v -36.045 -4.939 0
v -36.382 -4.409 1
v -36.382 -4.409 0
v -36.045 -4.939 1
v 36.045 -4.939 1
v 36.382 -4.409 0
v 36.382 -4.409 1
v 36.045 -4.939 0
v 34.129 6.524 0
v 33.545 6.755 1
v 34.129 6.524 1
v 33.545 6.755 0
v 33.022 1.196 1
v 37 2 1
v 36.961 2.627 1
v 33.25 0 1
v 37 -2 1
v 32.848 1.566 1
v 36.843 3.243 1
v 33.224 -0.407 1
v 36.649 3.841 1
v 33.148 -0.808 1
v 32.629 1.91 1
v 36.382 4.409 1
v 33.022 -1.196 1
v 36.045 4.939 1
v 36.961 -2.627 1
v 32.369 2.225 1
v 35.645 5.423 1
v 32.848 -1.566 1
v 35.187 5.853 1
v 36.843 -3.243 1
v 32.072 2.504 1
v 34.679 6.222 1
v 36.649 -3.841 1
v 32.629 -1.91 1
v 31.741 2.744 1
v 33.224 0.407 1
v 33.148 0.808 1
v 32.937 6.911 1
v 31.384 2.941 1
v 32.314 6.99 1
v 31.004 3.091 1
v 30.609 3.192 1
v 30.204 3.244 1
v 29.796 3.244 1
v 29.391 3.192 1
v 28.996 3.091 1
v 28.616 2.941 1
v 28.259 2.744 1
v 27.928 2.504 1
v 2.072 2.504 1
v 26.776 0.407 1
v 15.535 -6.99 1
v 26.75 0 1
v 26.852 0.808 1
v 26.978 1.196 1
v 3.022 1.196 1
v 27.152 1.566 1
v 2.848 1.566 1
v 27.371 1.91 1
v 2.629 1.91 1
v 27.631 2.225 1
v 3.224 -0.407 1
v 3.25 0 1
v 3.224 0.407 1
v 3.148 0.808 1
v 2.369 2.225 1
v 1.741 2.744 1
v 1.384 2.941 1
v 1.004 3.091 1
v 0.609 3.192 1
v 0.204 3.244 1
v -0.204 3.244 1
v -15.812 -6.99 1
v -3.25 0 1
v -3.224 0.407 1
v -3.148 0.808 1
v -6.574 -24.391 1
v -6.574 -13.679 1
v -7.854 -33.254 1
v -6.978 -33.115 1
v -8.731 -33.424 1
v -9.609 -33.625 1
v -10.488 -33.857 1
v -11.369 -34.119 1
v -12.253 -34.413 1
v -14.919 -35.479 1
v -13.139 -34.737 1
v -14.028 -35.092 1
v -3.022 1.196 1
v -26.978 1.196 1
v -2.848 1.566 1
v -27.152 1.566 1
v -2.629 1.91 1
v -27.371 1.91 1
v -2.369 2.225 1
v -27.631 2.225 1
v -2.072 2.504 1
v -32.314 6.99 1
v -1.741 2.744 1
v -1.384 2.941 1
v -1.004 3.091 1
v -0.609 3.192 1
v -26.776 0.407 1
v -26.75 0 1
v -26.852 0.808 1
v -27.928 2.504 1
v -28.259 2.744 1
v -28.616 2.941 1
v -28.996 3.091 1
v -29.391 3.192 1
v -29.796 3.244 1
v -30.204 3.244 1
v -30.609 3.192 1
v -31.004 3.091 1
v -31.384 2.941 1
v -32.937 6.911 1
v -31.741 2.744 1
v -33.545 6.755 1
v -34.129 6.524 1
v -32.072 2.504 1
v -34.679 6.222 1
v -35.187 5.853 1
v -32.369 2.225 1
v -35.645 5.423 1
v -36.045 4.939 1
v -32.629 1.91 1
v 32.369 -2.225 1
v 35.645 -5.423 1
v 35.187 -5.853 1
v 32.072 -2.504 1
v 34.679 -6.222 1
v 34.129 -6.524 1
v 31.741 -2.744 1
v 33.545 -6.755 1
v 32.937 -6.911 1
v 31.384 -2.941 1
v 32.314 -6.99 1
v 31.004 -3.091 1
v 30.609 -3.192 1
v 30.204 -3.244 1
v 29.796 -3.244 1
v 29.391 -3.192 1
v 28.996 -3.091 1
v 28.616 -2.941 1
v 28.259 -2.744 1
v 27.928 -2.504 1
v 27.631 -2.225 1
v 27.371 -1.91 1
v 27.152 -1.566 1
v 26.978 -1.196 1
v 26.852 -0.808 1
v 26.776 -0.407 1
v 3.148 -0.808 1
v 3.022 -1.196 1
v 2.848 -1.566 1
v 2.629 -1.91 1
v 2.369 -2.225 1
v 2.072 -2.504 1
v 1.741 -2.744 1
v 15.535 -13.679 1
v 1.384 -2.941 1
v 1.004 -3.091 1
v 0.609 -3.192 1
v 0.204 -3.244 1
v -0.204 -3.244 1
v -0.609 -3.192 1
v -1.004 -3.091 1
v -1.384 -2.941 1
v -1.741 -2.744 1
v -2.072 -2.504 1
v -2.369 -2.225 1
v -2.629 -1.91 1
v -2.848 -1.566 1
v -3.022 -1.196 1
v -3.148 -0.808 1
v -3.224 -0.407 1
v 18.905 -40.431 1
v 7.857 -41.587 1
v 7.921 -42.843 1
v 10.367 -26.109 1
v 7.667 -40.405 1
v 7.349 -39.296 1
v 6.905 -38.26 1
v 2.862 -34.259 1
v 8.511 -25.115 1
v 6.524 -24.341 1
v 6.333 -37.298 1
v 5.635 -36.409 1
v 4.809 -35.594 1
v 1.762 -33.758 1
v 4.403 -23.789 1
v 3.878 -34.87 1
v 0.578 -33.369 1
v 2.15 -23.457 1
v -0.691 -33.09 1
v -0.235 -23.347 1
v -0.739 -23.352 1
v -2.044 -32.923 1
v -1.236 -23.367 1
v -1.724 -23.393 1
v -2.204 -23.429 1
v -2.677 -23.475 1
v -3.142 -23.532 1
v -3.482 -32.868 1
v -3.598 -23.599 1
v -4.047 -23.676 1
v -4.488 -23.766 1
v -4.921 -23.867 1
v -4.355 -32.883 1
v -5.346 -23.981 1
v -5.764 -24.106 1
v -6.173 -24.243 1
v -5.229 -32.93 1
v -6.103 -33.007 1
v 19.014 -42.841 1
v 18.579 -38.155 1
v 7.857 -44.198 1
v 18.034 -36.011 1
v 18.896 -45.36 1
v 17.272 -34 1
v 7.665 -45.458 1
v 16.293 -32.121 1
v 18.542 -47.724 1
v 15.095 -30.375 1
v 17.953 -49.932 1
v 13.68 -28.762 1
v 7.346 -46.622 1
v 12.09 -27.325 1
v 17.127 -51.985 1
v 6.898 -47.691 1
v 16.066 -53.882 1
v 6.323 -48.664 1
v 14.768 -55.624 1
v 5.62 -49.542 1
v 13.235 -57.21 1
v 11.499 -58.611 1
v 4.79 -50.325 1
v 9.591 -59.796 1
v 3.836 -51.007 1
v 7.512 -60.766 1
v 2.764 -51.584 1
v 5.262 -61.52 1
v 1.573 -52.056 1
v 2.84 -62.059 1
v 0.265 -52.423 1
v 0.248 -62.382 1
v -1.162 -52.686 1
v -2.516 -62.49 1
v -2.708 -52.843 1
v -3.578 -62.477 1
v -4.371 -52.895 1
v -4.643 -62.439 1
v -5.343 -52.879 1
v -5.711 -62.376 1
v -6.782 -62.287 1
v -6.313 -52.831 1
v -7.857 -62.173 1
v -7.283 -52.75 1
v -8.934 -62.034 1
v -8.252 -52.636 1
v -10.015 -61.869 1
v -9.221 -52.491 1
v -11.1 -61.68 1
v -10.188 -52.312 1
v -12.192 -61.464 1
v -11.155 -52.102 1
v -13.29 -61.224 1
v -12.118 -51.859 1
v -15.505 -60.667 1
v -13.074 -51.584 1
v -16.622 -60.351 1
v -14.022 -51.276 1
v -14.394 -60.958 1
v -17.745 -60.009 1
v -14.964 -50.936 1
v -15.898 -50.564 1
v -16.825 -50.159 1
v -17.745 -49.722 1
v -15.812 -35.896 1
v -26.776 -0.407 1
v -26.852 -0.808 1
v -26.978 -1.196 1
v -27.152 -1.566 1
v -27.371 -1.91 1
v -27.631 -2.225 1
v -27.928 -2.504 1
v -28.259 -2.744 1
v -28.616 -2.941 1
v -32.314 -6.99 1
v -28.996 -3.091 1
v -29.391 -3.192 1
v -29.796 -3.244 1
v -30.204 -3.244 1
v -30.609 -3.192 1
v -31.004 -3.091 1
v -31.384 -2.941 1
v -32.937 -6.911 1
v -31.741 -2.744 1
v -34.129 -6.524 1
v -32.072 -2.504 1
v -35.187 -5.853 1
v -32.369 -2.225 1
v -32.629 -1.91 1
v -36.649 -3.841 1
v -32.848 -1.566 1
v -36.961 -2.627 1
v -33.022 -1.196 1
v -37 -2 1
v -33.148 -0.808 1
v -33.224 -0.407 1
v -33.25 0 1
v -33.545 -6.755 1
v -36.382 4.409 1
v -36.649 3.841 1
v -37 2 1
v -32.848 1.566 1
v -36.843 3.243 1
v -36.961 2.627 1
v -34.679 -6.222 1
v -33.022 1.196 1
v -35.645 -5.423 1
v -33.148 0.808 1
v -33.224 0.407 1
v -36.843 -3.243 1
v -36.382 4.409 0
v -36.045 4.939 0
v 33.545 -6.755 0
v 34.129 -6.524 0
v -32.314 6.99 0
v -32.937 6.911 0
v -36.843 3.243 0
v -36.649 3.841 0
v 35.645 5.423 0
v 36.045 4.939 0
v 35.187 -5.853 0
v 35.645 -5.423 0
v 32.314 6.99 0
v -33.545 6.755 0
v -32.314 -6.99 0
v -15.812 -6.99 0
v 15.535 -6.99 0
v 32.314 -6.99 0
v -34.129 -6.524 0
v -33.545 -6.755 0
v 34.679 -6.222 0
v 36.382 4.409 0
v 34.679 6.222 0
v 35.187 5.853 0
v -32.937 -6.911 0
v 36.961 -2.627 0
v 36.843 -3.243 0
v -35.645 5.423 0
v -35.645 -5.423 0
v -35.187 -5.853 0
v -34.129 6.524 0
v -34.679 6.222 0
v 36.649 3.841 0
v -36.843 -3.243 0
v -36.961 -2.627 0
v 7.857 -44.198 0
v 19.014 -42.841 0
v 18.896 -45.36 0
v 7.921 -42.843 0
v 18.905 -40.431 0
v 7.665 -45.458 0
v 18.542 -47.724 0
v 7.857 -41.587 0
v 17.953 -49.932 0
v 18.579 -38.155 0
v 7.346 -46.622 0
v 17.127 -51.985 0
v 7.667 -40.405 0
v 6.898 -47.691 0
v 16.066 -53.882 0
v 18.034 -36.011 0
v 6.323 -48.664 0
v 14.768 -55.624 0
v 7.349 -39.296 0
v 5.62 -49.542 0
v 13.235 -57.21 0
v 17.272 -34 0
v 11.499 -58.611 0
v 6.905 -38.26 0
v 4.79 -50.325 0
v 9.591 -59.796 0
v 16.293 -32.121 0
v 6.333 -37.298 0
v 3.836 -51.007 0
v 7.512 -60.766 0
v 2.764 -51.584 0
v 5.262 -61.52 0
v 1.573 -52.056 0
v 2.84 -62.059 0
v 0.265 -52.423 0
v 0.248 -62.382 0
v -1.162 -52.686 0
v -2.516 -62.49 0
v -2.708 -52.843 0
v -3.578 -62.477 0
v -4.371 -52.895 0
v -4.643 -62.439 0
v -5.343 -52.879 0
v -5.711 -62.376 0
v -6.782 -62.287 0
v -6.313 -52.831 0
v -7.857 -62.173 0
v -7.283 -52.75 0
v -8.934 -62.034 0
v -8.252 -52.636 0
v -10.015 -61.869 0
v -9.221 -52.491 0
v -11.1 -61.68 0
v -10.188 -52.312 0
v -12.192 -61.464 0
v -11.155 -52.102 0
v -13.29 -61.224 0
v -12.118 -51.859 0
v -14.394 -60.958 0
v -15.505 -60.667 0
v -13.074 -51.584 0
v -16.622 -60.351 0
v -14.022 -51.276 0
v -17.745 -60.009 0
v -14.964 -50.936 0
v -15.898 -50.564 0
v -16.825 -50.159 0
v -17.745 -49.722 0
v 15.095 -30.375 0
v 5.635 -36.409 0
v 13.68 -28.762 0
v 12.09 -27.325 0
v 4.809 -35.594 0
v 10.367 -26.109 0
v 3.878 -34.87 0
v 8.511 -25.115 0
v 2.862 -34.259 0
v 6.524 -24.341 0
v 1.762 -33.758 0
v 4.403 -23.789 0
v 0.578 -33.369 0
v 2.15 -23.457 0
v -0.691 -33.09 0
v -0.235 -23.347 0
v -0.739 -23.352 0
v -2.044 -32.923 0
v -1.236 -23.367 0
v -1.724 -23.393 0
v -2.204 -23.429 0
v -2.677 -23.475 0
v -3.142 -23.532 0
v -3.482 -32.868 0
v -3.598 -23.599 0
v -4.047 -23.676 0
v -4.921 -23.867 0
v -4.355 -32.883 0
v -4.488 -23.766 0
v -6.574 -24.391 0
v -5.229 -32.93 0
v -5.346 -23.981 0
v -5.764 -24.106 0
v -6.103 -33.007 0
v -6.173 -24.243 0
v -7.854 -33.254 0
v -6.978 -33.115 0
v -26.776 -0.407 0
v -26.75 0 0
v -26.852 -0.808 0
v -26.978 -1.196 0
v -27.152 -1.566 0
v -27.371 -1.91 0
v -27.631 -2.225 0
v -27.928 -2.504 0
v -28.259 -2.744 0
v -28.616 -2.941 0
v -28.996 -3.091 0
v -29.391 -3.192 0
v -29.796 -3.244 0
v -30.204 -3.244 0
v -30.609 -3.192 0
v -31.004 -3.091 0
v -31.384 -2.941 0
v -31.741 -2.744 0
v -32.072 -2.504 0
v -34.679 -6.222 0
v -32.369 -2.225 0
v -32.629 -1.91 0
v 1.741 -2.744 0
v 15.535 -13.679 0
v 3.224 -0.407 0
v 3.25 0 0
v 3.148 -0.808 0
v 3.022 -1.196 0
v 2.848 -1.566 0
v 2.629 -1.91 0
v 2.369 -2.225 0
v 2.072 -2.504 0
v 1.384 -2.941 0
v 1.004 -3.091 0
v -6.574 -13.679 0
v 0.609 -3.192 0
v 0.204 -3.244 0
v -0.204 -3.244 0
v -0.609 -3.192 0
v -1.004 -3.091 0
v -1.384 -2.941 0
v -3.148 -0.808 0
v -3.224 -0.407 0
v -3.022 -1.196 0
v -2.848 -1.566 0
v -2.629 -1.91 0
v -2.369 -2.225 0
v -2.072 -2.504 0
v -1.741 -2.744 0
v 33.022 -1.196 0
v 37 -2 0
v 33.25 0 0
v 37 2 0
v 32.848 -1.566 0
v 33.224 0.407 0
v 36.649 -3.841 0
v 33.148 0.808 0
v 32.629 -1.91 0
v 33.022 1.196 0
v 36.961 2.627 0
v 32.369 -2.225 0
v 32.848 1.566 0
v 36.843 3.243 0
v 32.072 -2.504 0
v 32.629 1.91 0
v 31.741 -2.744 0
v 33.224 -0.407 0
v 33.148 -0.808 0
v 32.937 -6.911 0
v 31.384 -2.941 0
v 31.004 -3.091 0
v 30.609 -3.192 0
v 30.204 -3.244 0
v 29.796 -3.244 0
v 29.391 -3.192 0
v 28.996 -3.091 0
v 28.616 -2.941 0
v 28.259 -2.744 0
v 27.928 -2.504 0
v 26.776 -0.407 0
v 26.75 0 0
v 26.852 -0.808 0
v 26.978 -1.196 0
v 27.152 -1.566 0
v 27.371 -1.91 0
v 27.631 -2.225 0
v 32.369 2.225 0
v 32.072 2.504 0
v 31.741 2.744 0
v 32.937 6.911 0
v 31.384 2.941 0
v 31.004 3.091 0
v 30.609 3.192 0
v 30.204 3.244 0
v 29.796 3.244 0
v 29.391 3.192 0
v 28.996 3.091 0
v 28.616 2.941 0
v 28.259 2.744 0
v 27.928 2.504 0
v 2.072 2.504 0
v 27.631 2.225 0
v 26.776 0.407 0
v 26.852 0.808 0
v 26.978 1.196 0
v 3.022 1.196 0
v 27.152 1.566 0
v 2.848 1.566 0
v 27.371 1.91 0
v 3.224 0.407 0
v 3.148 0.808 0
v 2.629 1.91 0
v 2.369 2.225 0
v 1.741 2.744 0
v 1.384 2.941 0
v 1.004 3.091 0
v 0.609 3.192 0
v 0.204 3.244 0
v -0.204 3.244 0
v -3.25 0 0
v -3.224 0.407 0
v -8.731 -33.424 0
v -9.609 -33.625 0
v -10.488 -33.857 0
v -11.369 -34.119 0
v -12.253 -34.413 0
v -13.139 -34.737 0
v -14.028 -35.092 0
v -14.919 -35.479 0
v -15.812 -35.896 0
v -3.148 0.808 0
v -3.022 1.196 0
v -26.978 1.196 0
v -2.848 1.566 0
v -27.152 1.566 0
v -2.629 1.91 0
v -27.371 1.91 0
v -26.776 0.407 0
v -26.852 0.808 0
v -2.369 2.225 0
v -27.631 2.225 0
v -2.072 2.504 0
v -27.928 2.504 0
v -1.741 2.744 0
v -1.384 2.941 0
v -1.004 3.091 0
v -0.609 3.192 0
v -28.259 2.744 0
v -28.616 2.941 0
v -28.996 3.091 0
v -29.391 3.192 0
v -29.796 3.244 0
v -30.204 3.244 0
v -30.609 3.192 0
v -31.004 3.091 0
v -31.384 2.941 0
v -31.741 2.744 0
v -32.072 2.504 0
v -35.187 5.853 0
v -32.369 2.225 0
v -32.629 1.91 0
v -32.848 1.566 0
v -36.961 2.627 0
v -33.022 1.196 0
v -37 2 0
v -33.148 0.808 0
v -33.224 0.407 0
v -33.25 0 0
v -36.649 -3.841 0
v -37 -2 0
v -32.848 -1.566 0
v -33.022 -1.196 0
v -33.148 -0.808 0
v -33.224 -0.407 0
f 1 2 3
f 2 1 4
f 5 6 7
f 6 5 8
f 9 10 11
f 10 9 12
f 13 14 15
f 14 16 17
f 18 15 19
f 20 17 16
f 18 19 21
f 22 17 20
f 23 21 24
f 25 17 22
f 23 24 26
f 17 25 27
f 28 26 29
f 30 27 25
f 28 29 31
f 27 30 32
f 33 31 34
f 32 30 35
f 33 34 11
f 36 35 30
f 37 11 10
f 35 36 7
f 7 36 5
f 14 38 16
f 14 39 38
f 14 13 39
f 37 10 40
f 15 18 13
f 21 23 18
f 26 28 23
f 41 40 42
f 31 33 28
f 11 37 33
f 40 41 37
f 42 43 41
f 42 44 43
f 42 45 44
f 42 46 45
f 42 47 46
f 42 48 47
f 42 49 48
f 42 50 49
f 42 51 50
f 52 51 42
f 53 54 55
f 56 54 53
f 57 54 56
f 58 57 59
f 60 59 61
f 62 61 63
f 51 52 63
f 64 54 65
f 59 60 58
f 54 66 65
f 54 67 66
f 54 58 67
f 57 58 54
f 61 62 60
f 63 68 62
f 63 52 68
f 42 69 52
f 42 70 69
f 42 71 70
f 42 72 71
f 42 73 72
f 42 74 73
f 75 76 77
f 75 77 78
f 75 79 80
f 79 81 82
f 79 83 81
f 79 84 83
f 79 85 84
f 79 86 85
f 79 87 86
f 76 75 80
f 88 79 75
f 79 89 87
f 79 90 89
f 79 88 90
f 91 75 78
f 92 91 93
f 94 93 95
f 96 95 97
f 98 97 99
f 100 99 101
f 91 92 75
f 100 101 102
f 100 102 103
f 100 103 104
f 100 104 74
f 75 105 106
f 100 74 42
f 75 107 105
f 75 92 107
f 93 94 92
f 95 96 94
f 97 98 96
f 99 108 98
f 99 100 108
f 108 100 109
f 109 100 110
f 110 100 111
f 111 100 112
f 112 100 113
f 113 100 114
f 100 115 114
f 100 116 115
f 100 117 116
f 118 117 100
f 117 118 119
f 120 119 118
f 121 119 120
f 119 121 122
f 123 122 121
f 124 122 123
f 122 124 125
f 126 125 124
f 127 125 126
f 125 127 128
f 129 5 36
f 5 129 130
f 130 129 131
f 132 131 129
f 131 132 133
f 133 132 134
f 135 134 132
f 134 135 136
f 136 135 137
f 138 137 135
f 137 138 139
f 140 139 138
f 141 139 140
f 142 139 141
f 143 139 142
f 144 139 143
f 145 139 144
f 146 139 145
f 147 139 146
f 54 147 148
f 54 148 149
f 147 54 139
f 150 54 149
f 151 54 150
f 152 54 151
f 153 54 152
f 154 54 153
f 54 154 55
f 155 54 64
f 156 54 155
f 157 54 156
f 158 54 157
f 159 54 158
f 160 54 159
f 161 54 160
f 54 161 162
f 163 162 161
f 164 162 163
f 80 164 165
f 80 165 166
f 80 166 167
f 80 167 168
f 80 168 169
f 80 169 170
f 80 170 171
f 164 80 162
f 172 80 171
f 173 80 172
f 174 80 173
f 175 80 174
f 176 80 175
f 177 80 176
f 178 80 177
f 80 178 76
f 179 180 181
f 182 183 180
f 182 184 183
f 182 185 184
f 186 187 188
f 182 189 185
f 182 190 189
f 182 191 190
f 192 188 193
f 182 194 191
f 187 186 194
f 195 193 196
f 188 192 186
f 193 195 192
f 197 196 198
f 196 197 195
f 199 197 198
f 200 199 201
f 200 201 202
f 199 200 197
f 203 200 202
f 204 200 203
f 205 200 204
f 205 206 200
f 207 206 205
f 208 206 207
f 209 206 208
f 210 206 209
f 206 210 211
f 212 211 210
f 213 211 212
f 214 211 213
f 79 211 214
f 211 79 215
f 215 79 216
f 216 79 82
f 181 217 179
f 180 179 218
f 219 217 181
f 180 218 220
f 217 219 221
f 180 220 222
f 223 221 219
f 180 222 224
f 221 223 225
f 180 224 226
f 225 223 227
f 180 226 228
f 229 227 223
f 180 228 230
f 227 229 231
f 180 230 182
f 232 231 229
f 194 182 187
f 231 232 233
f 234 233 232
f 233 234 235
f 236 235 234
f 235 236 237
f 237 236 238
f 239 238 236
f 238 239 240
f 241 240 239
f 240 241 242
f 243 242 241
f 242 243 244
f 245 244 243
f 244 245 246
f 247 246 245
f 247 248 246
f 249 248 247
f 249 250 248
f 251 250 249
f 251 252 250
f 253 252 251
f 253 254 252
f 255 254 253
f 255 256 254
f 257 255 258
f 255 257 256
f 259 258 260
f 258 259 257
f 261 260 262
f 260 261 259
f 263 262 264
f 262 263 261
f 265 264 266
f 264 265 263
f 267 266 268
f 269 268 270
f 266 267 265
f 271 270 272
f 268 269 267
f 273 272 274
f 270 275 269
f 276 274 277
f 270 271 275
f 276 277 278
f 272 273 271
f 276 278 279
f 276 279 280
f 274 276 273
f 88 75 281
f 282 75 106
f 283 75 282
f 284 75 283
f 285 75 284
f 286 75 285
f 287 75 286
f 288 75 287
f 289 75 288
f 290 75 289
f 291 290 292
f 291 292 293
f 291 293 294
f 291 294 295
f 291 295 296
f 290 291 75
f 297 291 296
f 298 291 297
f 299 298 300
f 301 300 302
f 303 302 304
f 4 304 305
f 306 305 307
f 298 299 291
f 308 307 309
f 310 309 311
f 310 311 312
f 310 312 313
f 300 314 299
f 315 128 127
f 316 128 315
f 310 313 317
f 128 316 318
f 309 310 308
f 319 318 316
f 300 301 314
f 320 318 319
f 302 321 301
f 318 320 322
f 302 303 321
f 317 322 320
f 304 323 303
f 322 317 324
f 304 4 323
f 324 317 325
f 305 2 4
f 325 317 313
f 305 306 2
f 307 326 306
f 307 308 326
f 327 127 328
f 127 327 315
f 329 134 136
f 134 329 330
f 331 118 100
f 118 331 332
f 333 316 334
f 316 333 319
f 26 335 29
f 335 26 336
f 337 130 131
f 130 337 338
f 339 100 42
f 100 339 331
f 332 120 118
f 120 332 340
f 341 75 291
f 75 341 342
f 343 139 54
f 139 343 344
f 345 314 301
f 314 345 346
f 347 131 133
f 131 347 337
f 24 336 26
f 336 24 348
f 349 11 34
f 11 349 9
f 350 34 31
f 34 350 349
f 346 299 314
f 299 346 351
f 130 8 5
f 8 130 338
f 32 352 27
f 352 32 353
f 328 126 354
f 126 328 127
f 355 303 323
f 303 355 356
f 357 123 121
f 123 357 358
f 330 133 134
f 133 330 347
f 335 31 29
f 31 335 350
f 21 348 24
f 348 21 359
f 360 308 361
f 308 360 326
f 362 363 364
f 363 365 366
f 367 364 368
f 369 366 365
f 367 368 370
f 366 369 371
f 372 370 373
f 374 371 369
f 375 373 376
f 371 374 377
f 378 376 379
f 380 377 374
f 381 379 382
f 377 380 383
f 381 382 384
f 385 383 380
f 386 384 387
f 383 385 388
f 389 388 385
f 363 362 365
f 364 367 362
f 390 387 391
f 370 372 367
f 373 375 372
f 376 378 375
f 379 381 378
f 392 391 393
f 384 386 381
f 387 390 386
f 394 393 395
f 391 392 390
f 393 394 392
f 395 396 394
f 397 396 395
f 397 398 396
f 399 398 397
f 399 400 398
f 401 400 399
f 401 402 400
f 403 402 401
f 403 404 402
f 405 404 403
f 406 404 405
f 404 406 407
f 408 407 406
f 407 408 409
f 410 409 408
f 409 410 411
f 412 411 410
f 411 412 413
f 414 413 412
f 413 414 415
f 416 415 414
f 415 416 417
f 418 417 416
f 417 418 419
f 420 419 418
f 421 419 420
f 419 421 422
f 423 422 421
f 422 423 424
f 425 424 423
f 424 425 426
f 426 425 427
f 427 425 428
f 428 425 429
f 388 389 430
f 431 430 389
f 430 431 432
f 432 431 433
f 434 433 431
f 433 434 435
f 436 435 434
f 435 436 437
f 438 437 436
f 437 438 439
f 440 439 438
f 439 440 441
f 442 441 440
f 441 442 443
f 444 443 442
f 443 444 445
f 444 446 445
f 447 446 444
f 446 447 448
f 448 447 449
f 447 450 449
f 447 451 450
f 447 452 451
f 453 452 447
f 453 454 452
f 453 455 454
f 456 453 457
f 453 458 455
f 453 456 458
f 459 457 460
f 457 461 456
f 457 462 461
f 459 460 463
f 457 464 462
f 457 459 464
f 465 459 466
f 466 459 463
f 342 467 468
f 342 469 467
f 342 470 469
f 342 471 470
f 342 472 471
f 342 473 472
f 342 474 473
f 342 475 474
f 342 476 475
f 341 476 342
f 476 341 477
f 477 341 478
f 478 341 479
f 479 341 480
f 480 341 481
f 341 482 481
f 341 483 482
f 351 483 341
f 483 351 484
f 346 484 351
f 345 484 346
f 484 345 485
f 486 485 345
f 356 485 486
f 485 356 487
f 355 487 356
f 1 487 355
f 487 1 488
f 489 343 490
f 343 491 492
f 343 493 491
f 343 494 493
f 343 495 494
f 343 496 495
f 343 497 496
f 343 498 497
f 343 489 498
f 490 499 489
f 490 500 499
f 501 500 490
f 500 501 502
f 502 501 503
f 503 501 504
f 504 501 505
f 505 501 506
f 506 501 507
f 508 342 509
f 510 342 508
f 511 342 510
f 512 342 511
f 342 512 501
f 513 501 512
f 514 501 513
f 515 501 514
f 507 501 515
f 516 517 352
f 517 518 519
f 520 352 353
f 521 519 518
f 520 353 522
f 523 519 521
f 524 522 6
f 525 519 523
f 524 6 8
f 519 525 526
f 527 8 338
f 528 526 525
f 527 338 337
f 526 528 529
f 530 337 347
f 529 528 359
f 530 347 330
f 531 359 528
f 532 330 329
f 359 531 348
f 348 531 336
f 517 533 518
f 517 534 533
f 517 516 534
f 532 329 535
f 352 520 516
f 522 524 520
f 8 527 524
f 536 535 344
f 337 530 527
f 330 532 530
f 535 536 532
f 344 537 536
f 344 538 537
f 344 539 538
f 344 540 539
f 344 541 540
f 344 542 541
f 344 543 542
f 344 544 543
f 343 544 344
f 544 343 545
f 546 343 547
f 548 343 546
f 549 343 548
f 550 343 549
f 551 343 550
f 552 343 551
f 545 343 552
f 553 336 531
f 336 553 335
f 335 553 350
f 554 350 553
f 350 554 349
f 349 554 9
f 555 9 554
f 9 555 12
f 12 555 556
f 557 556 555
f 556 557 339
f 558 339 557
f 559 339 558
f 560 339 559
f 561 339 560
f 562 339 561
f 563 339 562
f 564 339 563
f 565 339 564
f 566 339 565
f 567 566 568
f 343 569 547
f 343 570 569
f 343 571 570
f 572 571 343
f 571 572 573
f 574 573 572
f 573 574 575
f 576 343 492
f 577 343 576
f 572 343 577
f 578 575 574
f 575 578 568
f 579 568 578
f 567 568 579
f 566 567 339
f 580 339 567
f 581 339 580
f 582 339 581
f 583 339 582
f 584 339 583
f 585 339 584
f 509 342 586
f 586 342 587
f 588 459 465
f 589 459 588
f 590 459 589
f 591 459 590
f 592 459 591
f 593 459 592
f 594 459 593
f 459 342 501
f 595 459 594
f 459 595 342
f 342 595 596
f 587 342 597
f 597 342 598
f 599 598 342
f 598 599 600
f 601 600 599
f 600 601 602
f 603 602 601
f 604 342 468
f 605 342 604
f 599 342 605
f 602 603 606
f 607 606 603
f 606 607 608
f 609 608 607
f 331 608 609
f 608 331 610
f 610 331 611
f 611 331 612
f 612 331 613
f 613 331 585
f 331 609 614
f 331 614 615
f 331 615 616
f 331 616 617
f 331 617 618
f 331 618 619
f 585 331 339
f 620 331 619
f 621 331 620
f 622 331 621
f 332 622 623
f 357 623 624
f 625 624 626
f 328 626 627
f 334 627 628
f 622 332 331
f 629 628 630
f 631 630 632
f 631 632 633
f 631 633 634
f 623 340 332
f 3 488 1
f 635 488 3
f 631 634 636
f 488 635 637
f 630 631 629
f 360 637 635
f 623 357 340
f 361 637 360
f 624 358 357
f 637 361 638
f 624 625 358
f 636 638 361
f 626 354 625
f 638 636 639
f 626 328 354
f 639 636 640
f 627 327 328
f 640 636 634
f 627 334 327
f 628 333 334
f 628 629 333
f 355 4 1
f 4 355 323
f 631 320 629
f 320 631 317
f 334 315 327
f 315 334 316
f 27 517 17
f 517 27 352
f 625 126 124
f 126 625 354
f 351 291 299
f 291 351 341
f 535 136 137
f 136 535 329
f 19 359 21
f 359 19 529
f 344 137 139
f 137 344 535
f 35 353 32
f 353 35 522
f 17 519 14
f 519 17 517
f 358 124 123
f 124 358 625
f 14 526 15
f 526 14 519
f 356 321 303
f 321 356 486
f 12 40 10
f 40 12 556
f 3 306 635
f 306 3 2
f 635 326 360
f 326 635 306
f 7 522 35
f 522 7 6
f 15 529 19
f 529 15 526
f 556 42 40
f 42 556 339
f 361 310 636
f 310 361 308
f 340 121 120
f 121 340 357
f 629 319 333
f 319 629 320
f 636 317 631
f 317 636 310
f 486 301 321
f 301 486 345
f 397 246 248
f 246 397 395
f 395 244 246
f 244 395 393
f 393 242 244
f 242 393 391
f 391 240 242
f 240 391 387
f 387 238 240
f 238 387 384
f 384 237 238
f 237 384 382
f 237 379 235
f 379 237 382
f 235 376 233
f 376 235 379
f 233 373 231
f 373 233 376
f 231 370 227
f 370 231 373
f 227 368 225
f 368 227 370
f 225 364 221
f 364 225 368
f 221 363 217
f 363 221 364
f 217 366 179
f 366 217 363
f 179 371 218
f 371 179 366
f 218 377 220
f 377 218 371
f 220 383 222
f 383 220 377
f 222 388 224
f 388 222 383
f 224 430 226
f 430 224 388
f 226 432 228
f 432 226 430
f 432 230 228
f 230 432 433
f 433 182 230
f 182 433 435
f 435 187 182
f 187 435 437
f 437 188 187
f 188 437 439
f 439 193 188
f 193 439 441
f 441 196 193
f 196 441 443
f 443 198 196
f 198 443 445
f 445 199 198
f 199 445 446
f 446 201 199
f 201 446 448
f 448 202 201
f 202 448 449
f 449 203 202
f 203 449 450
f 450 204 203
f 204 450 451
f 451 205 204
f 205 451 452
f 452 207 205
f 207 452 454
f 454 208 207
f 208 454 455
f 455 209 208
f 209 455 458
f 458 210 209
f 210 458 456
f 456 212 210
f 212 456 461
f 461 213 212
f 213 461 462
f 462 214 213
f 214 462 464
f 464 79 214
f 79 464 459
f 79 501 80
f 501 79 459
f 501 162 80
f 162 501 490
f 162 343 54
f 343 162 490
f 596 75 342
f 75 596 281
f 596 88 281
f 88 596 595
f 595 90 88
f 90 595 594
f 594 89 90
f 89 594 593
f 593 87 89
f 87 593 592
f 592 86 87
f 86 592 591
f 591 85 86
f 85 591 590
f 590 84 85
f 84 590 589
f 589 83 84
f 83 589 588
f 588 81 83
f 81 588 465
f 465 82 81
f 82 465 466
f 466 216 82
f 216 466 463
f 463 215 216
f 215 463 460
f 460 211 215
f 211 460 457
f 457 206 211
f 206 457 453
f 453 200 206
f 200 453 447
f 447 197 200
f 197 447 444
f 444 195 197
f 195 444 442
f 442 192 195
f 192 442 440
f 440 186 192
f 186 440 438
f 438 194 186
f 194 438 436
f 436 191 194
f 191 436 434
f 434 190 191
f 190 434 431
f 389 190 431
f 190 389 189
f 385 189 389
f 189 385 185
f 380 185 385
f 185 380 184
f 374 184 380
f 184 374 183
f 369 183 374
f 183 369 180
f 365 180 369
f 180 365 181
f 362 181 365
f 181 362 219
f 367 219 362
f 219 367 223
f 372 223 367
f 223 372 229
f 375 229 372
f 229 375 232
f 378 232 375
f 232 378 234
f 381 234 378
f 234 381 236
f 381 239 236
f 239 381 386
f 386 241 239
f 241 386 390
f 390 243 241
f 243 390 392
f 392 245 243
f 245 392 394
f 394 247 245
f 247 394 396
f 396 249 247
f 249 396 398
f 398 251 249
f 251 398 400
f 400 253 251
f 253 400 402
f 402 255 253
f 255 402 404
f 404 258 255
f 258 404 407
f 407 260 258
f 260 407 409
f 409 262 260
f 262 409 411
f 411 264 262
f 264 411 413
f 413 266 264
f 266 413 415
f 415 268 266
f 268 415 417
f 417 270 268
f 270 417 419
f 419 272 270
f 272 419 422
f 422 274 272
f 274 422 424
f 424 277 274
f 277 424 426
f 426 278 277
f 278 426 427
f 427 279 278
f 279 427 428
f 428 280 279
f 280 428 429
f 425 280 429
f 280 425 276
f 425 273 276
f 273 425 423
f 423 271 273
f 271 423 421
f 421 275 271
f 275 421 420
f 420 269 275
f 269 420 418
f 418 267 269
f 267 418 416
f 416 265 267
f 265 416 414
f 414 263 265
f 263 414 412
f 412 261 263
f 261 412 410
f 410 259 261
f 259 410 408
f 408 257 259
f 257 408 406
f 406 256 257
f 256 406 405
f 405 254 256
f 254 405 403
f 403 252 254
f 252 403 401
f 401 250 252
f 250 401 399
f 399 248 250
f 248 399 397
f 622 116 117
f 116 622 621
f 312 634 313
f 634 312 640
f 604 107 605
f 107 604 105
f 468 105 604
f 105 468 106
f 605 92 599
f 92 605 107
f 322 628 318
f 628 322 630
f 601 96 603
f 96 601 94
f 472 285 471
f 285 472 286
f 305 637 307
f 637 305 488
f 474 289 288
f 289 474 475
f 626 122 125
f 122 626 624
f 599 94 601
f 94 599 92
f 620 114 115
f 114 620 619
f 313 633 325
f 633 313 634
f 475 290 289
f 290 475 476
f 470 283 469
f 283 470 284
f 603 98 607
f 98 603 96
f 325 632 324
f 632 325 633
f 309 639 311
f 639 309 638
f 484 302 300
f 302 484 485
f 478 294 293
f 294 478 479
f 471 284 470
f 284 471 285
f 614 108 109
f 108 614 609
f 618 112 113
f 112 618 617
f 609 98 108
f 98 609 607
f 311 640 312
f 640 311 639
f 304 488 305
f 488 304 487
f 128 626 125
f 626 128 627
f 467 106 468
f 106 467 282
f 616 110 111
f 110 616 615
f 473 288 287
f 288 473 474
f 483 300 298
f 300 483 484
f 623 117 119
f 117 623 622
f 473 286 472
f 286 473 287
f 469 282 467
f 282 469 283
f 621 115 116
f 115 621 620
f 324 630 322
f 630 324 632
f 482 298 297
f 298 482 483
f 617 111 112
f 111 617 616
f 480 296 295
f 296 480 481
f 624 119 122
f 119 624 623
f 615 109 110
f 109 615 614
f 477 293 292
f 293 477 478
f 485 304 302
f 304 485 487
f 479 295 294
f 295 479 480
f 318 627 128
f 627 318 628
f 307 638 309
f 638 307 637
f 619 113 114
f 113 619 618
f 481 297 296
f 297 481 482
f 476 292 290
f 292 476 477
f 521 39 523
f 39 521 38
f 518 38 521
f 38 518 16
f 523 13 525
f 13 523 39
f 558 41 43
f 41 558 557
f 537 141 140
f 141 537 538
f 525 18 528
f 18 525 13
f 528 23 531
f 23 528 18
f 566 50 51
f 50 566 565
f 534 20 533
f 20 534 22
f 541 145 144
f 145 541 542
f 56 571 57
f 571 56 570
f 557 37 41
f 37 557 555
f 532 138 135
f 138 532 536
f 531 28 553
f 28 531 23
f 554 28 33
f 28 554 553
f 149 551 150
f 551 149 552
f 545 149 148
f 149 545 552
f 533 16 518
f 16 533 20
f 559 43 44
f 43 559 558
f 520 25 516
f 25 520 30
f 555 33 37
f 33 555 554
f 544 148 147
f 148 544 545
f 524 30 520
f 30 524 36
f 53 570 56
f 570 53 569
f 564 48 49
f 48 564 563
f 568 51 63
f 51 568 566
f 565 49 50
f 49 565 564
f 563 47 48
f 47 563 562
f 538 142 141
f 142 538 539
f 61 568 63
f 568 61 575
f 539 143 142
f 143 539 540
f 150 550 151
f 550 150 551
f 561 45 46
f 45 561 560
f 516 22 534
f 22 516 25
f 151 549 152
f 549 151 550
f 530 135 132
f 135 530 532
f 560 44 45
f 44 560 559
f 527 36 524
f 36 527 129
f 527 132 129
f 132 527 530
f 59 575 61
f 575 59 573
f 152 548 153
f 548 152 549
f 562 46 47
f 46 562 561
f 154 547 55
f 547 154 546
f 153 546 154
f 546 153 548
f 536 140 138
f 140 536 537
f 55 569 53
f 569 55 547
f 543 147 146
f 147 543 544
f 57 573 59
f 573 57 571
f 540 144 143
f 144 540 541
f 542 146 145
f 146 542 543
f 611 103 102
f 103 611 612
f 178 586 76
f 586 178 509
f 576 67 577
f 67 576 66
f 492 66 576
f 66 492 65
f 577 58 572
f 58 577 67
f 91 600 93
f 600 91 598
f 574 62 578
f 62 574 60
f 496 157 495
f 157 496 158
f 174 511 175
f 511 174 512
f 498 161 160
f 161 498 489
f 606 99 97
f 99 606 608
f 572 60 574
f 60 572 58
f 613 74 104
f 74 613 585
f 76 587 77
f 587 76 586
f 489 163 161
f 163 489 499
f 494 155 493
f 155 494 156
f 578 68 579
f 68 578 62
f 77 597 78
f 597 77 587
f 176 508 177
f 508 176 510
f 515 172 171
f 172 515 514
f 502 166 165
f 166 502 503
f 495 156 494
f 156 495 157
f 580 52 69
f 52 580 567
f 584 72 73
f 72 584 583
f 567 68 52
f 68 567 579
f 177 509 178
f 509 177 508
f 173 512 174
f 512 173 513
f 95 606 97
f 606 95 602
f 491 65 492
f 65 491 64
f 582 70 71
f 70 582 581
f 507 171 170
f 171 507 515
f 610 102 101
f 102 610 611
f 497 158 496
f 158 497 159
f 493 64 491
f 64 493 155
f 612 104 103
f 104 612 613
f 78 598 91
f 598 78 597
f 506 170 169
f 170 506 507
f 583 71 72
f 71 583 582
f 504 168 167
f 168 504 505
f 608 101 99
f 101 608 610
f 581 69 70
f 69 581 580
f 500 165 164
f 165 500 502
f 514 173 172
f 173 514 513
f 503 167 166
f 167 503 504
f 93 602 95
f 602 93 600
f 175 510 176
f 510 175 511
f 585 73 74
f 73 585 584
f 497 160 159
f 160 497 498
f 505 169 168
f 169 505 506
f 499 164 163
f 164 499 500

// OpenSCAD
$fn = 50;


difference() {
	union() {
		translate(v = [0, 0, 0]) {
			rotate(a = [0, 0, 0]) {
				hull() {
					translate(v = [-32.0000000000, 2.0000000000, 0]) {
						rotate(a = [0, 0, 0]) {
							translate(v = [0, 0, 0]) {
								rotate(a = [0, 0, 0]) {
									cylinder(h = 1, r = 5);
								}
							}
						}
					}
					translate(v = [32.0000000000, 2.0000000000, 0]) {
						rotate(a = [0, 0, 0]) {
							translate(v = [0, 0, 0]) {
								rotate(a = [0, 0, 0]) {
									cylinder(h = 1, r = 5);
								}
							}
						}
					}
					translate(v = [-32.0000000000, -2.0000000000, 0]) {
						rotate(a = [0, 0, 0]) {
							translate(v = [0, 0, 0]) {
								rotate(a = [0, 0, 0]) {
									cylinder(h = 1, r = 5);
								}
							}
						}
					}
					translate(v = [32.0000000000, -2.0000000000, 0]) {
						rotate(a = [0, 0, 0]) {
							translate(v = [0, 0, 0]) {
								rotate(a = [0, 0, 0]) {
									cylinder(h = 1, r = 5);
								}
							}
						}
					}
				}
			}
		}
		translate(v = [0, -5, 0]) {
			rotate(a = [0, 0, 0]) {
				linear_extrude(height = 1) {
					text(font = "DejaVu Sans Mono:style=Bold", halign = "center", size = 57.0000000000, text = "5", valign = "top");
				}
			}
		}
	}
	union() {
		translate(v = [-30.0000000000, 0.0000000000, -125.0000000000]) {
			rotate(a = [0, 0, 0]) {
				cylinder(h = 250, r = 3.2500000000);
			}
		}
		translate(v = [30.0000000000, 0.0000000000, -125.0000000000]) {
			rotate(a = [0, 0, 0]) {
				cylinder(h = 250, r = 3.2500000000);
			}
		}
		translate(v = [30.0000000000, 0.0000000000, -125.0000000000]) {
			rotate(a = [0, 0, 0]) {
				cylinder(h = 250, r = 3.2500000000);
			}
		}
		translate(v = [0, 0, -125.0000000000]) {
			rotate(a = [0, 0, 0]) {
				cylinder(h = 250, r = 3.2500000000);
			}
		}
	}
}
